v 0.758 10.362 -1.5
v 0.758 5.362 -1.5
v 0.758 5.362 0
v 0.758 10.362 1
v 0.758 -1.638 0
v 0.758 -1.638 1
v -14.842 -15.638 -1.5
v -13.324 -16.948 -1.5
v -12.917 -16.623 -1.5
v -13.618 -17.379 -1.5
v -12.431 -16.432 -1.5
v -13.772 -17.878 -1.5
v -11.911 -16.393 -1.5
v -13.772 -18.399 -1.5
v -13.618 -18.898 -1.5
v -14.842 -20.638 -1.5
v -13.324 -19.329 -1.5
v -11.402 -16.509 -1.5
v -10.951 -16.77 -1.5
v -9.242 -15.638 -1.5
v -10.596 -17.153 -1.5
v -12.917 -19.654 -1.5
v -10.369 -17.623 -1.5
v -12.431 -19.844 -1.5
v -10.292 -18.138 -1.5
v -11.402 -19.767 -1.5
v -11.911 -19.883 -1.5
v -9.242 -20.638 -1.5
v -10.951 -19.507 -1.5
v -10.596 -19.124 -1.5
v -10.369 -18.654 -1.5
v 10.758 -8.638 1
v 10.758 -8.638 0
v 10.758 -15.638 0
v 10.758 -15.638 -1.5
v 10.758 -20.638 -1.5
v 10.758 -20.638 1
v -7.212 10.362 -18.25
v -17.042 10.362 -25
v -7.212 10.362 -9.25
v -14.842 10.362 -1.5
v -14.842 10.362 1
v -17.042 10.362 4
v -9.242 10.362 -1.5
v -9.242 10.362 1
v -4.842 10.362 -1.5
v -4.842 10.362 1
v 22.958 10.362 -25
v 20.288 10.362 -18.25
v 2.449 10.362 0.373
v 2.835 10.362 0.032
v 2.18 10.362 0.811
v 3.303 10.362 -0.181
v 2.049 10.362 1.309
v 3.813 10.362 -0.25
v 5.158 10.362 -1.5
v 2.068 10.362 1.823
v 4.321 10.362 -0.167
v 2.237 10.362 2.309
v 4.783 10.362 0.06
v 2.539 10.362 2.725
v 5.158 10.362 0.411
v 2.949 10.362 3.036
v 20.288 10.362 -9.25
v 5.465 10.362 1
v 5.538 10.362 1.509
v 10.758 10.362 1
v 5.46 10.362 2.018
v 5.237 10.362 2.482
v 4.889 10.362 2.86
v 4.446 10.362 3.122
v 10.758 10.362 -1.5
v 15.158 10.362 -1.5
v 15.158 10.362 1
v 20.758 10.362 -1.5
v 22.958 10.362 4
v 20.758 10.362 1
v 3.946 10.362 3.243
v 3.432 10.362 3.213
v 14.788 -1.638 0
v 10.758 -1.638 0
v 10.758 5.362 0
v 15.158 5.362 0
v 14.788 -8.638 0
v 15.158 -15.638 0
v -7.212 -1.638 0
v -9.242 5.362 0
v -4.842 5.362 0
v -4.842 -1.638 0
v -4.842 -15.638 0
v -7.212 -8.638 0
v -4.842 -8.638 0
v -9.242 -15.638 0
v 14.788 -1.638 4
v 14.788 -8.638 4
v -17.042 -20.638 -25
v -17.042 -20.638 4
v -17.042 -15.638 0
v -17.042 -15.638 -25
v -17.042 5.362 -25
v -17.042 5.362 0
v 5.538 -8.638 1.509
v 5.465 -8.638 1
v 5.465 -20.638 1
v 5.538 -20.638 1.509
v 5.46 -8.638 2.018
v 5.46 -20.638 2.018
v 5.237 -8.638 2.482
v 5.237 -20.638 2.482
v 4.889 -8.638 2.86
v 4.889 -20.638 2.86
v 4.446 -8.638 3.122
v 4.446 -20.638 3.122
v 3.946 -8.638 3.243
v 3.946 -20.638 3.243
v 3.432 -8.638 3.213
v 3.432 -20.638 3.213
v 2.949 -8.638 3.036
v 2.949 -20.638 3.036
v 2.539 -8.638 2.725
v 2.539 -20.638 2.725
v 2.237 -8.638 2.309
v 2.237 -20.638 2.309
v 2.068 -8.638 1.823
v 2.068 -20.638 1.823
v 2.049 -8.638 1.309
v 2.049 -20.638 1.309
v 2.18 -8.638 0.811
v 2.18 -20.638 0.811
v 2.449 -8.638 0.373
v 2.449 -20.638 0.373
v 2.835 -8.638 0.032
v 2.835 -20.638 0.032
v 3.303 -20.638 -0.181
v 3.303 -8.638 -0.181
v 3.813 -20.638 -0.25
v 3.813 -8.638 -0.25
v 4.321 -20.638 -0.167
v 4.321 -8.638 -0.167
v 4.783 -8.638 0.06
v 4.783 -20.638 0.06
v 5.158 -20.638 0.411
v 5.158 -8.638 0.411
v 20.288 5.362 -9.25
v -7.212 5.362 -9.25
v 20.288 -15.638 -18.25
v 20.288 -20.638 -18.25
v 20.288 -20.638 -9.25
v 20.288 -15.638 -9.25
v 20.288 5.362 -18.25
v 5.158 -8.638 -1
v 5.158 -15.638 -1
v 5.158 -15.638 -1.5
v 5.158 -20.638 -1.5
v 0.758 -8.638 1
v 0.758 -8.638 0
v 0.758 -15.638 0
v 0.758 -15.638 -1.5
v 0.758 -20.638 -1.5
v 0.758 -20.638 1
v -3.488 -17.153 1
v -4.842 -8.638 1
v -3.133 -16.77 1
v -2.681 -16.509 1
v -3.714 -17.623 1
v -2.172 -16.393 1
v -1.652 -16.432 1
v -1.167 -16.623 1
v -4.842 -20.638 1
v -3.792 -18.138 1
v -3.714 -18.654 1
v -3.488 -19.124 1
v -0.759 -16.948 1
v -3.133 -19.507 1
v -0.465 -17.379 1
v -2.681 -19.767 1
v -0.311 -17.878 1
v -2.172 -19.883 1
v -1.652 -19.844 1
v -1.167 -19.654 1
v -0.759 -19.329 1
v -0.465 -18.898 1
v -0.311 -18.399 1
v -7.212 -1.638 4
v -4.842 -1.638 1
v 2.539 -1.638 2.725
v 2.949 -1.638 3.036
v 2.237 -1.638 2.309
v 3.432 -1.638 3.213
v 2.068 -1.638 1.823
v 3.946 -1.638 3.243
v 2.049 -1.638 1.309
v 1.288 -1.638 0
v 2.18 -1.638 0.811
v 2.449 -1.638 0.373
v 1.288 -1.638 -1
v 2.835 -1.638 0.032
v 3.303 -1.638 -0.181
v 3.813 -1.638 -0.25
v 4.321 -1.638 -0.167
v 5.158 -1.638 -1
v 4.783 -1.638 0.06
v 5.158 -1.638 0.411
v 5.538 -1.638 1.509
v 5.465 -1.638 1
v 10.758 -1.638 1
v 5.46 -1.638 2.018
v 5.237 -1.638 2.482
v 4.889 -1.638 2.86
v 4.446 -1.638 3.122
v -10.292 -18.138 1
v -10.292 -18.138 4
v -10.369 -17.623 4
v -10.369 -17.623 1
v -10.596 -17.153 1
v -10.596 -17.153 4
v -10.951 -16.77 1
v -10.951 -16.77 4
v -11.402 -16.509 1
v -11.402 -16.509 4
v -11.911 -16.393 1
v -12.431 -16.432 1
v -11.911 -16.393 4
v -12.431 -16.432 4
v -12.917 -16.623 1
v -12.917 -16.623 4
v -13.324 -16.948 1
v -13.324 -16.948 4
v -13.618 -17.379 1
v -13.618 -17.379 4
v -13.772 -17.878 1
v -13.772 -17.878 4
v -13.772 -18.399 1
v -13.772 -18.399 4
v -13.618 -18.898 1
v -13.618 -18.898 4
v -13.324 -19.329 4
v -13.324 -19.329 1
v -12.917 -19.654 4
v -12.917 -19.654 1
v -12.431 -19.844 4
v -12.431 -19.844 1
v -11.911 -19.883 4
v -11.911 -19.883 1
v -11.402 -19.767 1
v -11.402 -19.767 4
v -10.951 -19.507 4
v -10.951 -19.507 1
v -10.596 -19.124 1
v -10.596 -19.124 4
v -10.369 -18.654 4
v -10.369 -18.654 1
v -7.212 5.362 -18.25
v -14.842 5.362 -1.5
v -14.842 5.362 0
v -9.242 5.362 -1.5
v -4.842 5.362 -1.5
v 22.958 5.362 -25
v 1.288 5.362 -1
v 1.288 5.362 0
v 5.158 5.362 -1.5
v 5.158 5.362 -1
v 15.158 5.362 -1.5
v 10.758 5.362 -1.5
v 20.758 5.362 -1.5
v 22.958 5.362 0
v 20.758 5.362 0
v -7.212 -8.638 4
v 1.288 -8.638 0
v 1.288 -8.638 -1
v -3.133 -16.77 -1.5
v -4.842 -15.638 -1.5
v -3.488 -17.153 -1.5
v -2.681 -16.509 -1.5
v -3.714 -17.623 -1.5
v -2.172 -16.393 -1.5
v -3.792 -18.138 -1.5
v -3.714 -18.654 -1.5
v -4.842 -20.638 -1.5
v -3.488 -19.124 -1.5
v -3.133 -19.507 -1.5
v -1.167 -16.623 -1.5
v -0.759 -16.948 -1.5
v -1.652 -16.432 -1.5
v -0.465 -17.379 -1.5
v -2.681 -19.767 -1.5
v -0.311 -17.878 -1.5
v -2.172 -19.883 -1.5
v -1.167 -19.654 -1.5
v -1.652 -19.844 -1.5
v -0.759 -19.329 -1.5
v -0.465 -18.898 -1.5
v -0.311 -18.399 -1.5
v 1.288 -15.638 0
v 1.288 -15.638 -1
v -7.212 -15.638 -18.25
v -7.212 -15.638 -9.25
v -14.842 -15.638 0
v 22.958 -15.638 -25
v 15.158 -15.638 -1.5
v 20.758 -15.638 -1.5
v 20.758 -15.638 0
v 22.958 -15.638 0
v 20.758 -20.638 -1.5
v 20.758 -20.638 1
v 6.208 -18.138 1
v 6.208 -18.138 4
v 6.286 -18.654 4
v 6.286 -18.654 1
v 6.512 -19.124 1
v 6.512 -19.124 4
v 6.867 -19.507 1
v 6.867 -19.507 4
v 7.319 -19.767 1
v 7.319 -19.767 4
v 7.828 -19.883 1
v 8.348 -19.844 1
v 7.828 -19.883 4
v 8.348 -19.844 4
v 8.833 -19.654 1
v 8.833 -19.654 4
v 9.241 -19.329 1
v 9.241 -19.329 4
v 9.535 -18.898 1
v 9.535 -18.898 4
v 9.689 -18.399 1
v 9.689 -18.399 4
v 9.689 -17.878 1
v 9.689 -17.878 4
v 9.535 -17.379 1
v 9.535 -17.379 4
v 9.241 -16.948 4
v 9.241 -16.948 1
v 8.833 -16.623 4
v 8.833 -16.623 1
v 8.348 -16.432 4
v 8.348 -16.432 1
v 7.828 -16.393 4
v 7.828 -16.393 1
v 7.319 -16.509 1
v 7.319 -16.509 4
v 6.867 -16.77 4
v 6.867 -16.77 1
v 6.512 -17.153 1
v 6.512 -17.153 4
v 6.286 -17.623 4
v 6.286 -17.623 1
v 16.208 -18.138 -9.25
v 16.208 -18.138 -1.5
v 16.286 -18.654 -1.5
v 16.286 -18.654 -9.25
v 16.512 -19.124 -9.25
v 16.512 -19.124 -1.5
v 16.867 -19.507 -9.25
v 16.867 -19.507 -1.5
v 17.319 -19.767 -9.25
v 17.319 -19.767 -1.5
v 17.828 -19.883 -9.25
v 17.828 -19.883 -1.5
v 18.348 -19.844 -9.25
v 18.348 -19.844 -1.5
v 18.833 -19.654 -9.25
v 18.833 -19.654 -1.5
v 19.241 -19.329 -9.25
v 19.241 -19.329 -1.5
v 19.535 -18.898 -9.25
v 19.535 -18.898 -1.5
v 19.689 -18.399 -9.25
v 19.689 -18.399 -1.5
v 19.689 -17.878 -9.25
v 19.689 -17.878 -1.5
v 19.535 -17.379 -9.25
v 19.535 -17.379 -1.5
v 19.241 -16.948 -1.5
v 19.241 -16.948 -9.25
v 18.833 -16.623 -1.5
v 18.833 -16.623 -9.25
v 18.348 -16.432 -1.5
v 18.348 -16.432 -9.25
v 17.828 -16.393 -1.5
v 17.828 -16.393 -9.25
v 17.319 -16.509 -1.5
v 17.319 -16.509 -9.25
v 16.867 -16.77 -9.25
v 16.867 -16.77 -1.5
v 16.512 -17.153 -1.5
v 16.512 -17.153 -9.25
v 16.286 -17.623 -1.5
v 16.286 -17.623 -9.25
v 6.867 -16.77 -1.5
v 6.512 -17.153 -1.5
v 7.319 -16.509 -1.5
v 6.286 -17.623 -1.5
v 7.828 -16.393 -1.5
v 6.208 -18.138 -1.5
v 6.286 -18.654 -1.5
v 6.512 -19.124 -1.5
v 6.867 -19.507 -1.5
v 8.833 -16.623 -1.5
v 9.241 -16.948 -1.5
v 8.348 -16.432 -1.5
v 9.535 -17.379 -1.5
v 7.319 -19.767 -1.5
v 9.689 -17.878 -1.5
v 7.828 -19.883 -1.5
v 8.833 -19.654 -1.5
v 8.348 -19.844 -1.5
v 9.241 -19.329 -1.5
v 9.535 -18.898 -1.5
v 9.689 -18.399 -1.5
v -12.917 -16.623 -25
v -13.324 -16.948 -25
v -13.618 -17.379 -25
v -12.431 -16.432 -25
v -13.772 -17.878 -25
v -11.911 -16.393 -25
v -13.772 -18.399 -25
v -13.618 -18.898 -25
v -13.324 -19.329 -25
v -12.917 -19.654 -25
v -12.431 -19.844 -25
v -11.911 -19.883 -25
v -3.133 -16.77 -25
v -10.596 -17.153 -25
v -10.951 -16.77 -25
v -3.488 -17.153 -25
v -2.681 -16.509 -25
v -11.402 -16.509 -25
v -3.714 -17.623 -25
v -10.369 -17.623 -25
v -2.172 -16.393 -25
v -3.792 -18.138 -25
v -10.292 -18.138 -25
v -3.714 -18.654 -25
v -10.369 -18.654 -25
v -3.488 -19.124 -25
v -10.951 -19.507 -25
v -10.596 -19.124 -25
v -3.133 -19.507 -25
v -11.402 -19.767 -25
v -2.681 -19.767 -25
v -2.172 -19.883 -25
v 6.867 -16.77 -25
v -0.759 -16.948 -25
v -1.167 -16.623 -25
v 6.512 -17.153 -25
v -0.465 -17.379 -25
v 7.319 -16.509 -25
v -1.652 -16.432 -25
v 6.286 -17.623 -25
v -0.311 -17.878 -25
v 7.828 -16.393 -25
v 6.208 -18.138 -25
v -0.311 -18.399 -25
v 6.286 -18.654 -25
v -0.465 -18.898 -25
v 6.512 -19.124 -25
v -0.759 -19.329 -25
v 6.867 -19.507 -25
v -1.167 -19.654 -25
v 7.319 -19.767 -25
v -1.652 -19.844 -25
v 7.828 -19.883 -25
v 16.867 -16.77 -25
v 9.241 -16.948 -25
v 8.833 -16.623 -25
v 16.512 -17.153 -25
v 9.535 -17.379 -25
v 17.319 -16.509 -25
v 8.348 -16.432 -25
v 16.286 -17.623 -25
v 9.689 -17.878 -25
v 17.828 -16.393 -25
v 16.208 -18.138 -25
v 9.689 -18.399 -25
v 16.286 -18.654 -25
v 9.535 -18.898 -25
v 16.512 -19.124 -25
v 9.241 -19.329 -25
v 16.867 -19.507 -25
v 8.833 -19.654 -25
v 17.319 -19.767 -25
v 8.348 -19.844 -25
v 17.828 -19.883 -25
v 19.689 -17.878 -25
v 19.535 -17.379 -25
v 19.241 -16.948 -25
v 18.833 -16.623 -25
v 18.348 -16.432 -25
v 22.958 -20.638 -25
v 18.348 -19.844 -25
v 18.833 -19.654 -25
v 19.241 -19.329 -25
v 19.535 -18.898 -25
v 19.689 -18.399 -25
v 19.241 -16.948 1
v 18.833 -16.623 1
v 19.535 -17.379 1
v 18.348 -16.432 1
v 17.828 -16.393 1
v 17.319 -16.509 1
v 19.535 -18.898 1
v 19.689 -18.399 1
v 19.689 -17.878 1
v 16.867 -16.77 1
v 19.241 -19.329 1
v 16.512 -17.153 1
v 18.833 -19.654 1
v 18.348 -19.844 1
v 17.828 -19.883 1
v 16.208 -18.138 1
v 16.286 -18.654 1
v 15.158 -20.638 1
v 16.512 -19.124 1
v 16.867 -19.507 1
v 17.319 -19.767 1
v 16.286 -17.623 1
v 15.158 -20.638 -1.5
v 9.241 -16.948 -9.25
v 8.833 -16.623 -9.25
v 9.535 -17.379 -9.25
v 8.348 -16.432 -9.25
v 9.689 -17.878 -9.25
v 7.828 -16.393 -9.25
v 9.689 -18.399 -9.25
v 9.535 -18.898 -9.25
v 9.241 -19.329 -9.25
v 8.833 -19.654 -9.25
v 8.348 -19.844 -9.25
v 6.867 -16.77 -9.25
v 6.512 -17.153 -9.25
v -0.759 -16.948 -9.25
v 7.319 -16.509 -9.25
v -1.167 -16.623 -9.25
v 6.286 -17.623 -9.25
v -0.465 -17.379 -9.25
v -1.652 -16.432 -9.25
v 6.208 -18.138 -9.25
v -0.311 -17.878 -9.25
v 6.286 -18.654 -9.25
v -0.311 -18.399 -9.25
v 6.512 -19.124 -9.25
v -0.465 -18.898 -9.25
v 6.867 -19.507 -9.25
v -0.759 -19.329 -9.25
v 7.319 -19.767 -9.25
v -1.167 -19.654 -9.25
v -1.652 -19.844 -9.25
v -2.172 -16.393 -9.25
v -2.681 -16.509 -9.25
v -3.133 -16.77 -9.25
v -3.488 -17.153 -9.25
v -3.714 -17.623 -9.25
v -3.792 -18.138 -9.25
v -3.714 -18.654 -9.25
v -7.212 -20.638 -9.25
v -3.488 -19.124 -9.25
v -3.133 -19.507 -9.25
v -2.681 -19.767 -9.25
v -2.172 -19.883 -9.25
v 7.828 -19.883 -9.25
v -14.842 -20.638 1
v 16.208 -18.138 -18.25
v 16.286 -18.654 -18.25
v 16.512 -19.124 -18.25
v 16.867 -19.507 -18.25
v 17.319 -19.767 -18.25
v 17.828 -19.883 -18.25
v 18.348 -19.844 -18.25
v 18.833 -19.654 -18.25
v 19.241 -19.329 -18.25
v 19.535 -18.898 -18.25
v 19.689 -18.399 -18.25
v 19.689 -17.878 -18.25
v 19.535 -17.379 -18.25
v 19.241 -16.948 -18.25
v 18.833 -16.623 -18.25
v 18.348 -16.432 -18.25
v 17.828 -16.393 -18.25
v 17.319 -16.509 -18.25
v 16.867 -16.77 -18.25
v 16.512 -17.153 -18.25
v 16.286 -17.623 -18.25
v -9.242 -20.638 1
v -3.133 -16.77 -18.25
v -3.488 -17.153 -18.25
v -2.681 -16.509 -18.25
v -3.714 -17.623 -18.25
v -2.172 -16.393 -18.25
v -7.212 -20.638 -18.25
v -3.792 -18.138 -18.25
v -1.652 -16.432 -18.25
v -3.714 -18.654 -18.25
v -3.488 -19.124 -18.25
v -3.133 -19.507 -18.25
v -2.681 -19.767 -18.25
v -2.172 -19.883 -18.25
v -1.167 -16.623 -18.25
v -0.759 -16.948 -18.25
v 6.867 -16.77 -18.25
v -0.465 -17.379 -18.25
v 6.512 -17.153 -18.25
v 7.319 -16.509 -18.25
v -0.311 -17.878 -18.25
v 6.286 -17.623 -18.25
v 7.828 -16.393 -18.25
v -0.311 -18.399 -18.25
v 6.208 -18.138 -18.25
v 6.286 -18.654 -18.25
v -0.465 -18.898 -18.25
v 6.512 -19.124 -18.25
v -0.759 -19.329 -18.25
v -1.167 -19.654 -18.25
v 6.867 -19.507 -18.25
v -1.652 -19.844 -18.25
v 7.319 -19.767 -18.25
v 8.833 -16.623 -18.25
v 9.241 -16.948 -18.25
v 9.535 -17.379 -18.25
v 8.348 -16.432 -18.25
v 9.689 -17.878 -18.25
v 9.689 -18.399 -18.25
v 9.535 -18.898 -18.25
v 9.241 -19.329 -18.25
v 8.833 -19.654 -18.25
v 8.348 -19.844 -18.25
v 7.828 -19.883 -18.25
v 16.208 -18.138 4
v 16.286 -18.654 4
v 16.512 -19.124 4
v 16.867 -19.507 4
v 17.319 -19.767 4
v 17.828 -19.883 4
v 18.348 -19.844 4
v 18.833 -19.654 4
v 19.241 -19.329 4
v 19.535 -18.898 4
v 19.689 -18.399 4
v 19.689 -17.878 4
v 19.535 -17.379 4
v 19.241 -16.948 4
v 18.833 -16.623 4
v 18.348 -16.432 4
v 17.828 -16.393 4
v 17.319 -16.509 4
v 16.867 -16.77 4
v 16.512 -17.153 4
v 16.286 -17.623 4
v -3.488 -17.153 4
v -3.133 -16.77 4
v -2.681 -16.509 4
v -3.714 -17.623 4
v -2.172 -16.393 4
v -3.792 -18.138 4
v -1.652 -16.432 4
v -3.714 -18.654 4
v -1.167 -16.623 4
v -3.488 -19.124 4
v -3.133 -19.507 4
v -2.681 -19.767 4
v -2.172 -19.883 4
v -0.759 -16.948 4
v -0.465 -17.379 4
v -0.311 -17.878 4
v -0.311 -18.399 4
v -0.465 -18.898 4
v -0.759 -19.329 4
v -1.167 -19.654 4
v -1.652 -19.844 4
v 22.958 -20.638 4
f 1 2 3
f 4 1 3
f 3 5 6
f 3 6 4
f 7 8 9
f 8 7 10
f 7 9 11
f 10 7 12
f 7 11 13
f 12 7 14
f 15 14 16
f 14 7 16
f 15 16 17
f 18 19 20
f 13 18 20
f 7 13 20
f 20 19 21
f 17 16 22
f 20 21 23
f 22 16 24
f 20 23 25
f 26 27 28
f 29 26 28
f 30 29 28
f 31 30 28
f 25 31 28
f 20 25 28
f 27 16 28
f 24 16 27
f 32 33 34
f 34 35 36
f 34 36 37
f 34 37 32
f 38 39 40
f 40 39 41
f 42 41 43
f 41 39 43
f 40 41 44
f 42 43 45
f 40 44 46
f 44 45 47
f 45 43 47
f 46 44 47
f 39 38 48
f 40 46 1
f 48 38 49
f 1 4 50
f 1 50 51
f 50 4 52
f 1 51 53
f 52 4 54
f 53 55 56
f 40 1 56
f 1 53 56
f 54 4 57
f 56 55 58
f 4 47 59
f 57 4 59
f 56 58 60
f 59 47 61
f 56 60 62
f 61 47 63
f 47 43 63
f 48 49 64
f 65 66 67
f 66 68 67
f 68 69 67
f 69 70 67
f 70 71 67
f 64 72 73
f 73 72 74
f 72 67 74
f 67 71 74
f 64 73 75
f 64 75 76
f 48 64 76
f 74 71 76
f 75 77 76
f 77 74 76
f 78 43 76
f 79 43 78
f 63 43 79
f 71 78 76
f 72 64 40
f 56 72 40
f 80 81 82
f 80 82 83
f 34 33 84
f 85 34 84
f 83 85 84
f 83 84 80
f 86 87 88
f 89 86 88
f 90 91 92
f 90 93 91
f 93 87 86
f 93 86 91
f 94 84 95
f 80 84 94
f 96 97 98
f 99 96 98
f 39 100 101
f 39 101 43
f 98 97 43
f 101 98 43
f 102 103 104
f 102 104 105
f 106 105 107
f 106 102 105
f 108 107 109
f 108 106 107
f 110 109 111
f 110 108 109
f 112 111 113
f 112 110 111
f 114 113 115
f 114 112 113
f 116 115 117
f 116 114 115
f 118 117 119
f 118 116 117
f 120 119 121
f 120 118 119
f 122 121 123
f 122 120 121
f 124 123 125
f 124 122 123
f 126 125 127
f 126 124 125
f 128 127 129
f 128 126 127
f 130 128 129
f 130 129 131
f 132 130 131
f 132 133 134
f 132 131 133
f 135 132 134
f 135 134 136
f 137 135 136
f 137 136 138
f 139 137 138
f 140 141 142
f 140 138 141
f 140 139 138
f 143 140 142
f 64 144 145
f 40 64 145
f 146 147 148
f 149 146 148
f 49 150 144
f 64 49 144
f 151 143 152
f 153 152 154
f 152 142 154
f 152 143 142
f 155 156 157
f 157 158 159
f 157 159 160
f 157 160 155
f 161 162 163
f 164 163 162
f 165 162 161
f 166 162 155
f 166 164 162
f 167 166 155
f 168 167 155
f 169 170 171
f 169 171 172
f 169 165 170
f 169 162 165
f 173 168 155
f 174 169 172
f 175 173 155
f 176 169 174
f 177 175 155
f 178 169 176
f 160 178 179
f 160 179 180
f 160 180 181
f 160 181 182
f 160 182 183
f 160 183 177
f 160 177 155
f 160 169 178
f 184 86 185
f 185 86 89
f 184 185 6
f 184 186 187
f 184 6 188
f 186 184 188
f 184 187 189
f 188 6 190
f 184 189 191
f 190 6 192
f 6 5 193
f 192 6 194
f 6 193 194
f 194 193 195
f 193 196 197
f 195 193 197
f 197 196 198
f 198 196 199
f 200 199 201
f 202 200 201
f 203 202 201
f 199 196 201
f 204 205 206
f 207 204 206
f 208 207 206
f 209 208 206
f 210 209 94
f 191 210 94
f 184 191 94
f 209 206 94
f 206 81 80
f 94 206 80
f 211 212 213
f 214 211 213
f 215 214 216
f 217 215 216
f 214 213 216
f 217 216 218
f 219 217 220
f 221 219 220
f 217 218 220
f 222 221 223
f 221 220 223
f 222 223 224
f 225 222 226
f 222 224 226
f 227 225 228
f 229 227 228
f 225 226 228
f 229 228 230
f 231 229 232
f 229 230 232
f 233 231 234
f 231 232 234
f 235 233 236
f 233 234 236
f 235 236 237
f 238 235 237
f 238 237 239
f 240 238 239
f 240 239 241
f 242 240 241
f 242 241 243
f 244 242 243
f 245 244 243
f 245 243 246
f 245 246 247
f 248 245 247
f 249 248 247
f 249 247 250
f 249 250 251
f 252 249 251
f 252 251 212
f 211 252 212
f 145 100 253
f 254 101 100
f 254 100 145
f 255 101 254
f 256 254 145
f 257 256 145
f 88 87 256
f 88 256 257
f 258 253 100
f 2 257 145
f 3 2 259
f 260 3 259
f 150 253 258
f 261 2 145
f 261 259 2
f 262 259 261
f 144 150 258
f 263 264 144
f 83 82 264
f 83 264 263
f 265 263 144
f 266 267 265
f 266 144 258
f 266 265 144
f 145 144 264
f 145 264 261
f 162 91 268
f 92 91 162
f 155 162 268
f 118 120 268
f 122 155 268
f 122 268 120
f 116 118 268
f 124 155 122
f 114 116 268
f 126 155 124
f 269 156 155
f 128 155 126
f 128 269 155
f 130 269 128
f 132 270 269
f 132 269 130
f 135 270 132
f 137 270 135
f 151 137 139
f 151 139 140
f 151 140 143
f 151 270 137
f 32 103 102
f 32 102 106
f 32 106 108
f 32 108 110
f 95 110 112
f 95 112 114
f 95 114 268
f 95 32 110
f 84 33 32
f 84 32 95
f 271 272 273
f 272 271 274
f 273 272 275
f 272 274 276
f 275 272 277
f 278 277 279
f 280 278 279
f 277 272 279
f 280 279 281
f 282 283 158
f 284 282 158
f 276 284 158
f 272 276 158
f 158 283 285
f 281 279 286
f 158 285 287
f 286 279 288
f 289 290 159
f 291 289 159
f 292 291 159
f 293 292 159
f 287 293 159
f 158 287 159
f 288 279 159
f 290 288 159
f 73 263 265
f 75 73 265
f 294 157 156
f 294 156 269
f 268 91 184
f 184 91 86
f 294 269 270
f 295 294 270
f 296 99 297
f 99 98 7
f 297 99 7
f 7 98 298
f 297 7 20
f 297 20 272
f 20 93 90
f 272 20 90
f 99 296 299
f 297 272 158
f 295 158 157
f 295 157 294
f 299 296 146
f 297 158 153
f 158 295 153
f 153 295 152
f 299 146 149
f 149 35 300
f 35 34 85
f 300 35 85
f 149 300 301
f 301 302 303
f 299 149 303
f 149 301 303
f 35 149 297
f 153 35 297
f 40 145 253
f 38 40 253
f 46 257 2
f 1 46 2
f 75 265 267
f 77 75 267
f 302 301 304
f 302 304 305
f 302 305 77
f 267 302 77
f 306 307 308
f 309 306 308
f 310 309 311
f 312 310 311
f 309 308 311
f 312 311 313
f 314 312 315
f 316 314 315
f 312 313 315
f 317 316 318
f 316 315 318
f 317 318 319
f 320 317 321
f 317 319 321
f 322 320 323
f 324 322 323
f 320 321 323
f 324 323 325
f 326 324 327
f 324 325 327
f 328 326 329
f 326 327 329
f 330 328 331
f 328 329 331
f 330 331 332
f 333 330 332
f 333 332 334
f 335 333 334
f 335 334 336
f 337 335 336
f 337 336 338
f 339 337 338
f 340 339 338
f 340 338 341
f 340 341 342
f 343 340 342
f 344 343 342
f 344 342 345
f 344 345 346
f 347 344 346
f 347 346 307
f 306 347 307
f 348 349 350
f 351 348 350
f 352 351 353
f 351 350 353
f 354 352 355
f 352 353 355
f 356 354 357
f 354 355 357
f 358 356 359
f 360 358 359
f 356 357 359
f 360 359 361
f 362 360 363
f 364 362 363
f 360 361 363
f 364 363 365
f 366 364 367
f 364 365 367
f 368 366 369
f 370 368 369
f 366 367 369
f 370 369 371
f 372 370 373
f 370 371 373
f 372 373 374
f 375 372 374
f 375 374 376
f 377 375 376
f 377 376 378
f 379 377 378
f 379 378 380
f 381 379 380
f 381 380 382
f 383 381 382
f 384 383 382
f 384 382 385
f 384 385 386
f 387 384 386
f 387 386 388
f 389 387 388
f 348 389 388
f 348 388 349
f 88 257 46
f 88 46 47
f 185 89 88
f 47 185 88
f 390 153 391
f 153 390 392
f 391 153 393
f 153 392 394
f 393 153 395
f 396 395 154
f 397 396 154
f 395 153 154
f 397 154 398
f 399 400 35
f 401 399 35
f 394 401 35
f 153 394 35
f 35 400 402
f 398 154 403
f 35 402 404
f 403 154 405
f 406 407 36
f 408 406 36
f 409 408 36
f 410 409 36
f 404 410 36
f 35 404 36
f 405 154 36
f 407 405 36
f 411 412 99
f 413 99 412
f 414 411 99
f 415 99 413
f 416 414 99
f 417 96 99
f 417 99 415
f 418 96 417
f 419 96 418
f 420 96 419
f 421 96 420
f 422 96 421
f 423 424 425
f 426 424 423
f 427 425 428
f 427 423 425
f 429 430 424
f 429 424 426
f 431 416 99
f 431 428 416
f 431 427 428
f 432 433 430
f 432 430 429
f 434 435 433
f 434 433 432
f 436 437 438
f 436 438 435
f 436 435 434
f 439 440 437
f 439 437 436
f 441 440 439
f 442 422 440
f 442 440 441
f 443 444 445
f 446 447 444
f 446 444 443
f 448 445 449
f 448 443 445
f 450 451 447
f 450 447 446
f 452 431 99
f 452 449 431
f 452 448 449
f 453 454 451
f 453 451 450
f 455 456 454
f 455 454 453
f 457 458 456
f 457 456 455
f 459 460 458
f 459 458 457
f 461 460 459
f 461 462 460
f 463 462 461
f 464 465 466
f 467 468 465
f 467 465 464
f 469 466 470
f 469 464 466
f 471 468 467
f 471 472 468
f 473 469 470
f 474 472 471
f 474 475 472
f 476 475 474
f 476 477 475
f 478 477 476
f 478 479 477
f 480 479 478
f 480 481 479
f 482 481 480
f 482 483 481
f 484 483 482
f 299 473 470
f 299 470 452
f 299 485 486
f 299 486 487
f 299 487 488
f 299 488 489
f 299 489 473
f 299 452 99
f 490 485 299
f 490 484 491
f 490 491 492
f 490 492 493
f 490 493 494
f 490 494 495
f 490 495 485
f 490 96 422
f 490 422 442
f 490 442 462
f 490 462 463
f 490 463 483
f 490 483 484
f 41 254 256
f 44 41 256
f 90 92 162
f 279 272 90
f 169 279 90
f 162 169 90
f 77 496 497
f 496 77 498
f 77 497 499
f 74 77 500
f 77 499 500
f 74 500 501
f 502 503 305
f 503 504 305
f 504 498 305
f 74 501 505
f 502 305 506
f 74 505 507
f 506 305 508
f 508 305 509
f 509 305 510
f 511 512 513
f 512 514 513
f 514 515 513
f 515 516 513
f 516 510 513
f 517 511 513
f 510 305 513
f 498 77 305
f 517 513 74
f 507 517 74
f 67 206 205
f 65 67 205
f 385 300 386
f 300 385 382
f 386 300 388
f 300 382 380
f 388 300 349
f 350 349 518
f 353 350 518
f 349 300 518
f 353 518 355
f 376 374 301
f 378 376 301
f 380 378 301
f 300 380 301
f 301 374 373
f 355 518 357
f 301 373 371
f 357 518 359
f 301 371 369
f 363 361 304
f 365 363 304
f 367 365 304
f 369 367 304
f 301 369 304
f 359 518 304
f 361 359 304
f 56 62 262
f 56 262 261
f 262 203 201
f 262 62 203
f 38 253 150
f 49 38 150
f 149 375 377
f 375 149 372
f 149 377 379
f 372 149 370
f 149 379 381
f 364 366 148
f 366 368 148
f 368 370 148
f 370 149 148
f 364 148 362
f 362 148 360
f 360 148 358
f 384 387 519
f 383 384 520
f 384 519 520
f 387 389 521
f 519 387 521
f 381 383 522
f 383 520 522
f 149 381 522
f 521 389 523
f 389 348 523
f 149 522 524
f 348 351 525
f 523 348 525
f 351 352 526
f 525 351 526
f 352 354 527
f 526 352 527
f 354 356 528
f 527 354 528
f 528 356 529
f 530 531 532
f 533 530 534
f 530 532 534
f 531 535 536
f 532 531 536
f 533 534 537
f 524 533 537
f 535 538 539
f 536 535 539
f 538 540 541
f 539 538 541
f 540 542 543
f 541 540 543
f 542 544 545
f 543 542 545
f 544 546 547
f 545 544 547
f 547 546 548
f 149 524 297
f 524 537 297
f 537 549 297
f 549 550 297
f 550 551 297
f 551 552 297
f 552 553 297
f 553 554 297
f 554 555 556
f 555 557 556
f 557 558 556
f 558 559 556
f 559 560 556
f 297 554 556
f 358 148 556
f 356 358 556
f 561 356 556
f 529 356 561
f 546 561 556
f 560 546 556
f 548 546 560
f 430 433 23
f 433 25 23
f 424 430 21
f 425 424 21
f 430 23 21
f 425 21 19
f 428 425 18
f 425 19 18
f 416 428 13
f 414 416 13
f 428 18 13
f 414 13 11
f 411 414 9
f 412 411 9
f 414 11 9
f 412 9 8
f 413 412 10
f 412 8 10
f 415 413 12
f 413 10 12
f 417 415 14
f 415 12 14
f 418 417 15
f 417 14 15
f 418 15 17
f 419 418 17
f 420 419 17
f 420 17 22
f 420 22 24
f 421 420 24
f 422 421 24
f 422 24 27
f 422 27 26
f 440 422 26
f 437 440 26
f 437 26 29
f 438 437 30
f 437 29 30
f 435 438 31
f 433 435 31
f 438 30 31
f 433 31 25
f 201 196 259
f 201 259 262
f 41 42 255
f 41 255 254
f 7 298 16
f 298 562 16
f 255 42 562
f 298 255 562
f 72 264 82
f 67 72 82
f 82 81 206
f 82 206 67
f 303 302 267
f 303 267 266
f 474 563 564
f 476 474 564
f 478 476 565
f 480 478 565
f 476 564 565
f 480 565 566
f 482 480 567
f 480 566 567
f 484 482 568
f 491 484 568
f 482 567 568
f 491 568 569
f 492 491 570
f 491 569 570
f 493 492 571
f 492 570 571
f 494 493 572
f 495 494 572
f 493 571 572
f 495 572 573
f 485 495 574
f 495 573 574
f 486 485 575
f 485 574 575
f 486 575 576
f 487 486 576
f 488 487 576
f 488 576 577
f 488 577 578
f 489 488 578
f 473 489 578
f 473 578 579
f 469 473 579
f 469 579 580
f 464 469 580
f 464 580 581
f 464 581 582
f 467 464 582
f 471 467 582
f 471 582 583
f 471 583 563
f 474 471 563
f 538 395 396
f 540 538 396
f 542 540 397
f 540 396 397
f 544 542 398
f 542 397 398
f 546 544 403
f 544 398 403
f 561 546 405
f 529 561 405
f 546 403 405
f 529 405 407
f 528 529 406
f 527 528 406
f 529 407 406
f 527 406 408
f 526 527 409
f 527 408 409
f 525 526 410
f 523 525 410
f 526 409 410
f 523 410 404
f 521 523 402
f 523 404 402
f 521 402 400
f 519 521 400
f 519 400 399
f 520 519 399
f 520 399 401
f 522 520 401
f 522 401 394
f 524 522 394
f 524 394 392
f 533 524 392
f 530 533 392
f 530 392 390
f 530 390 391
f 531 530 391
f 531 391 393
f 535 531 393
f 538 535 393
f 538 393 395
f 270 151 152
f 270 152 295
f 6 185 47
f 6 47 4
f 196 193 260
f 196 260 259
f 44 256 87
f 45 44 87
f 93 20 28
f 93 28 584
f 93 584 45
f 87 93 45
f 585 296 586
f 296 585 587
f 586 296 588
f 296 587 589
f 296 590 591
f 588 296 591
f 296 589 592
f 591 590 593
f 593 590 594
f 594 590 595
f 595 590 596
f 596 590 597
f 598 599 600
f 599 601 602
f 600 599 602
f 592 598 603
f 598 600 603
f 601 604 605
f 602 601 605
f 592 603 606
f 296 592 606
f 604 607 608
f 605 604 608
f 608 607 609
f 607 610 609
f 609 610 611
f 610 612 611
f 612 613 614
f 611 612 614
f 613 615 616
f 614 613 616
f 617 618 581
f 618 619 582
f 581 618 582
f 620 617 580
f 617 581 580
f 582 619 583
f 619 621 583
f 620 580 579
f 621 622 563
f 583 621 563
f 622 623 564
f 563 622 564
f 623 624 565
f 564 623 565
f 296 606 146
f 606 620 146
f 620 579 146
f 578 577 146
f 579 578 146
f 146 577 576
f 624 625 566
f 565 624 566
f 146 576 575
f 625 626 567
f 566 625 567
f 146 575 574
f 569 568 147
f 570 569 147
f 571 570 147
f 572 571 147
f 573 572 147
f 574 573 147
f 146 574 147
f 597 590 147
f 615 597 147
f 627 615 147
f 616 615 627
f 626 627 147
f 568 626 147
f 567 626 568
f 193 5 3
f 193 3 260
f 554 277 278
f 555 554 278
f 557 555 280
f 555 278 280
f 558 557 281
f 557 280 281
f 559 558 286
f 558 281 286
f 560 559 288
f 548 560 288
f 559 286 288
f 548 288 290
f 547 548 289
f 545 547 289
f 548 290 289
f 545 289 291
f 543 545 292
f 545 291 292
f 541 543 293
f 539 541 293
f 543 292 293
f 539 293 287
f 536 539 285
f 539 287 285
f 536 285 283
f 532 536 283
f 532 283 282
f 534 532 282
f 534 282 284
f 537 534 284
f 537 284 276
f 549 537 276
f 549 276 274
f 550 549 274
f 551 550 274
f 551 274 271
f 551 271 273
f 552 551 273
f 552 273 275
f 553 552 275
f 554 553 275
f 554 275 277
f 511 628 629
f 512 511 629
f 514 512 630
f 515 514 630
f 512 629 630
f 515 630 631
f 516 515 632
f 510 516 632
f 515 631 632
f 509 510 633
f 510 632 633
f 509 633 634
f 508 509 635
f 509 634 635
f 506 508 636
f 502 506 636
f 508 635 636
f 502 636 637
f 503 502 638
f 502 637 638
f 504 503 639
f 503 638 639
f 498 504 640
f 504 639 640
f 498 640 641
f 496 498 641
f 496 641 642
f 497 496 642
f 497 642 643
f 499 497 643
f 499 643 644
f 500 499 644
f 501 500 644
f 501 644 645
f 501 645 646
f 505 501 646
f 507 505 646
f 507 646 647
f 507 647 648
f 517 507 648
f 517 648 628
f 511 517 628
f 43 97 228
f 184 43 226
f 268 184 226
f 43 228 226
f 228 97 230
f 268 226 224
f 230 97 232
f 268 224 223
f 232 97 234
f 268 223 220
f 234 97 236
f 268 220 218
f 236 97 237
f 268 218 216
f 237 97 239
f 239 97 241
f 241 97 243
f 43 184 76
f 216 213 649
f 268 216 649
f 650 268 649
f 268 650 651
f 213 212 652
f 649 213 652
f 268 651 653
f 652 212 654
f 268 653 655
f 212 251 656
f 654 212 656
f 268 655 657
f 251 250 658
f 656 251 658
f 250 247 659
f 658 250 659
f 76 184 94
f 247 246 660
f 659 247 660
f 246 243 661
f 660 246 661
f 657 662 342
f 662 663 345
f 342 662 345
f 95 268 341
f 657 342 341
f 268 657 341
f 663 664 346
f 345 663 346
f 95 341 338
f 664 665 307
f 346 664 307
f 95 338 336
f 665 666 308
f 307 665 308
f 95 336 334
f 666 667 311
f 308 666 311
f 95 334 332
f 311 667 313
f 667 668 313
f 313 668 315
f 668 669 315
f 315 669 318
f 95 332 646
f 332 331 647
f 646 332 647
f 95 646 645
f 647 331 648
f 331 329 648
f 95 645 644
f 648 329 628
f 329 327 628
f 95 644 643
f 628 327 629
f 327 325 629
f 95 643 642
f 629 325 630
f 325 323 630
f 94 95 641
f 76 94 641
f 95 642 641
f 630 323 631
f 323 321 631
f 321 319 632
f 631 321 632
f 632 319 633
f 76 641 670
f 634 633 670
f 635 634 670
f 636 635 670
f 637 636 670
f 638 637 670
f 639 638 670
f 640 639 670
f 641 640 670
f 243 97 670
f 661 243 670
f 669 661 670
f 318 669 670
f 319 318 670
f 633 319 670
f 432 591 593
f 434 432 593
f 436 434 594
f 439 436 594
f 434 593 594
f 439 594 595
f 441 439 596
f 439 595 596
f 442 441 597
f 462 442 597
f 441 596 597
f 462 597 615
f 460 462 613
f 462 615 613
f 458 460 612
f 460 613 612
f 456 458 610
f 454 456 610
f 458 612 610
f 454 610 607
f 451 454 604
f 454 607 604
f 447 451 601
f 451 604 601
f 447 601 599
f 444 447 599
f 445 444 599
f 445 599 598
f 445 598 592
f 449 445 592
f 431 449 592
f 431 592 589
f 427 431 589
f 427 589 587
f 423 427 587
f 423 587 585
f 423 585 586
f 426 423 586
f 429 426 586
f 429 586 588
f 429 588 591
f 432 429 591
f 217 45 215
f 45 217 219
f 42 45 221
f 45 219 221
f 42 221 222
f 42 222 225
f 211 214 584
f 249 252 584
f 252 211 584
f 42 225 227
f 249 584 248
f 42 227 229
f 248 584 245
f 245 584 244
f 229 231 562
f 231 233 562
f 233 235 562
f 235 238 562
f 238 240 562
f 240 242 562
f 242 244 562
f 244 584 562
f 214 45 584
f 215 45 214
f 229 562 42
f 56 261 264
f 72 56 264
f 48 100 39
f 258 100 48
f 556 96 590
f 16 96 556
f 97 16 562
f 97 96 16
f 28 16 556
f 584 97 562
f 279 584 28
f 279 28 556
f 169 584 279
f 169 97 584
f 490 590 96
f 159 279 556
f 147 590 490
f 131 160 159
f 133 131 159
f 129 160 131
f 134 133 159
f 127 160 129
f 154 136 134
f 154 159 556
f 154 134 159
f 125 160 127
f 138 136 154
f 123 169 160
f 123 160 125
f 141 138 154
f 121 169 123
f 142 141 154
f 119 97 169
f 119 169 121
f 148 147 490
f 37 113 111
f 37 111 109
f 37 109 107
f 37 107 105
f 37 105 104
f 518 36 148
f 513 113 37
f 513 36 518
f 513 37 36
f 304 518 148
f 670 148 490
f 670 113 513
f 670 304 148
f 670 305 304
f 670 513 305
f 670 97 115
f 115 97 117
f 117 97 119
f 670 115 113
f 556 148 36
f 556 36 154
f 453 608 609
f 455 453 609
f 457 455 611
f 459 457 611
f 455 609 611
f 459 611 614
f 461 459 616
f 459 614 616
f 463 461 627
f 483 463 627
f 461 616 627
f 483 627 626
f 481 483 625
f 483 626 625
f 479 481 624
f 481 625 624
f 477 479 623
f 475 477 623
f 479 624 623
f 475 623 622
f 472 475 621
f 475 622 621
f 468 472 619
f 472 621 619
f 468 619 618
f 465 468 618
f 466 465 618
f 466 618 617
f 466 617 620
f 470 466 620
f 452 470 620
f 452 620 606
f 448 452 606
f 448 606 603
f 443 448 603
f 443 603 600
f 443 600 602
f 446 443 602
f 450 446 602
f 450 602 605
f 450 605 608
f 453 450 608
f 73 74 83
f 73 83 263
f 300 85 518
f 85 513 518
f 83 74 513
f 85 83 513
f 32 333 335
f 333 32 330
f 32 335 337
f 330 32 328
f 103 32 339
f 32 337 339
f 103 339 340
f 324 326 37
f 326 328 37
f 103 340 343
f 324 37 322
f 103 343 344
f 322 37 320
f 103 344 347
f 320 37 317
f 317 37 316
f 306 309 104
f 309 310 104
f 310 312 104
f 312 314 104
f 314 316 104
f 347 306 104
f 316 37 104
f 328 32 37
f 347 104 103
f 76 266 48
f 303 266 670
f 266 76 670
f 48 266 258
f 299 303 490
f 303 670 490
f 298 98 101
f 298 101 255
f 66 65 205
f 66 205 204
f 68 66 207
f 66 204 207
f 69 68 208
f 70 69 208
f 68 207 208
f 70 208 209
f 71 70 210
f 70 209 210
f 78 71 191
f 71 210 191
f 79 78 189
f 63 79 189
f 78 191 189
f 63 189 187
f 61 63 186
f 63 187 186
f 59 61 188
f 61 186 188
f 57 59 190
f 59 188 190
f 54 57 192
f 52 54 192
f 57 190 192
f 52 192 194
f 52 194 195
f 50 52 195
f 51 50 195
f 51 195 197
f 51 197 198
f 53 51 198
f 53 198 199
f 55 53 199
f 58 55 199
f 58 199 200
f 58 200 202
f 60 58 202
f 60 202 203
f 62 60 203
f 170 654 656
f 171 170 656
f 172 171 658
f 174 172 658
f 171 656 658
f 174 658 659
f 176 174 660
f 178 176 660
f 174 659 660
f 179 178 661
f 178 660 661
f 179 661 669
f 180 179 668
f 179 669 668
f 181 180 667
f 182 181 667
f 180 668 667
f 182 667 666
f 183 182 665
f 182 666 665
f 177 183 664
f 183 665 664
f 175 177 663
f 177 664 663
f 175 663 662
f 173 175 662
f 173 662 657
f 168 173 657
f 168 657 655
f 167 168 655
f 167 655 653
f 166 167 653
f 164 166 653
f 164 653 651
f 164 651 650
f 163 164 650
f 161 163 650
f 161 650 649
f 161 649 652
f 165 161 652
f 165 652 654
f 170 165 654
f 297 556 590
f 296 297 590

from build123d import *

# Parameters (mm, degrees)
F0_W      = 48.3402396964
F0_H      = 20
F0_W_2    = 22
F0_H_2    = 7
F1_DEPTH  = 4
F3_DEPTH  = 1
F4_R      = 1.75
F5_DEPTH  = 20.001
F6_DEPTH  = 5.5
F7_DEPTH  = 5.5
F8_W      = 21.6701198482
F8_H      = 5
F9_DEPTH  = 25
F10_W     = 21.6701198482
F10_H     = 5
F11_DEPTH = 25
F12_W     = 5
F12_H     = 5
F13_DEPTH = 24
F14_W     = 5
F14_H     = 5
F15_DEPTH = 24
F16_W     = 11
F16_H     = 4.5
F17_DEPTH = 31.001
F19_DEPTH = 29.001
F18_R     = 1.75
F20_DEPTH = 10
F21_W     = 5.6
F21_H     = 2.5
F22_DEPTH = 31.001
F23_DEPTH = 29.001


# Not quite as in the source:
# - a feature names something its author has since deleted; it is built from what else it names


with BuildPart() as f1:
    # F0 (on Top) → F1 (new body)
    with BuildSketch(Plane.XY):
        with Locations((3.7882691845, -5.1383437738)):
            Rectangle(F0_W, F0_H)
        with Locations((3.7882691845, -5.1383437738)):
            Rectangle(F0_W_2, F0_H_2, mode=Mode.SUBTRACT)
    extrude(amount=F1_DEPTH)

    # F2 (on face) → F3 (join)
    with BuildSketch(Plane(origin=(0, 0, 0), x_dir=(1, 0, 0), z_dir=(0, 0, -1))):
        Polygon((6.2882691845, 1.6383437738), (3.7882691845, 1.6383437738), (1.2882691845, 1.6383437738), (1.2882691845, -4.8616562262), (6.2882691845, -4.8616562262), align=None)
        Polygon((1.2882691845, 8.6383437738), (3.7882691845, 8.6383437738), (6.2882691845, 8.6383437738), (6.2882691845, 15.1383437738), (1.2882691845, 15.1383437738), align=None)
    extrude(amount=F3_DEPTH)

    # F4 (on face) → F5 (cut, through all)
    with BuildSketch(Plane.XZ.offset(15.1383437738)):
        with Locations((3.7882691845, 1.5)):
            Circle(F4_R)
    extrude(amount=-F5_DEPTH, mode=Mode.SUBTRACT)

    # F6 (add): a face of the model
    f6_faces = [f1.faces().sort_by_distance(p)[0] for p in [
        (-19.8958693087, -15.1383437738, 2),
    ]]
    extrude(f6_faces, amount=F6_DEPTH)

    # F7 (add): a face of the model
    f7_faces = [f1.faces().sort_by_distance(p)[0] for p in [
        (27.4724076777, 4.8616562262, 2),
    ]]
    extrude(f7_faces, amount=F7_DEPTH)

    # F8 (on face) → F9 (join)
    with BuildSketch(Plane(origin=(0, 0, 0), x_dir=(1, 0, 0), z_dir=(0, 0, -1))):
        with Locations((17.1233291086, -7.8616562262)):
            Rectangle(F8_W, F8_H)
        with Locations((17.1233291086, 18.1383437738)):
            Rectangle(F8_W, F8_H)
    extrude(amount=F9_DEPTH)

    # F10 (on face) → F11 (join)
    with BuildSketch(Plane(origin=(0, 0, 0), x_dir=(1, 0, 0), z_dir=(0, 0, -1))):
        with Locations((-9.5467907396, 18.1383437738)):
            Rectangle(F10_W, F10_H)
        with Locations((-9.5467907396, -7.8616562262)):
            Rectangle(F10_W, F10_H)
    extrude(amount=F11_DEPTH)

    # F12 (on face) → F13 (join)
    with BuildSketch(Plane(origin=(0, 0, -1), x_dir=(1, 0, 0), z_dir=(0, 0, -1))):
        with Locations((3.7882691845, 18.1383437738)):
            Rectangle(F12_W, F12_H)
    extrude(amount=F13_DEPTH)

    # F14 (on face) → F15 (join)
    with BuildSketch(Plane(origin=(0, 0, -1), x_dir=(1, 0, 0), z_dir=(0, 0, -1))):
        with Locations((3.7882691845, -7.8616562262)):
            Rectangle(F14_W, F14_H)
    extrude(amount=F15_DEPTH)

    # F16 (on face) → F17 (cut, through all)
    with BuildSketch(Plane.XZ.offset(20.6383437738)):
        with Locations((9.2882691845, -16)):
            Rectangle(F16_W, F16_H)
        Polygon((3.7882691845, -18.25), (3.7882691845, -13.75), (14.7882691845, -13.75), (14.7882691845, -9.25), (-7.2117308155, -9.25), (-7.2117308155, -18.25), align=None)
        Polygon((14.7882691845, -9.25), (14.7882691845, -13.75), (14.7882691845, -18.25), (20.2882691845, -18.25), (20.2882691845, -9.25), align=None)
    extrude(amount=-F17_DEPTH, mode=Mode.SUBTRACT)

    # F18 (on face) → F19 (cut, through all)
    with BuildSketch(Plane.XY.offset(4)):
        Polygon((-20.3818506637, -20.6383437738), (-17.0416109673, -20.6383437738), (-17.0416109673, -5.1383437738), (-17.0416109673, 10.3616562262), (-20.3818506637, 10.3616562262), align=None)
    extrude(amount=-F19_DEPTH, mode=Mode.SUBTRACT)

    # F18 (on face) → F20 (cut)
    with BuildSketch(Plane.XY.offset(4)):
        with Locations((-12.0416109673, -18.1383437738)):
            Circle(F18_R)
    extrude(amount=-F20_DEPTH, mode=Mode.SUBTRACT)

    # F21 (on face) → F22 (cut, through all)
    with BuildSketch(Plane.XZ.offset(20.6383437738)):
        Polygon((-12.0416109673, 1), (-14.8416109673, 1), (-14.8416109673, -1.5), (-9.2416109673, -1.5), (-9.2416109673, 1), align=None)
        Polygon((27.9583890327, 4), (22.9583890327, 4), (22.9583890327, 1), (22.9583890327, -25), (27.9583890327, -25), align=None)
        with Locations((-2.0416109673, -0.25)):
            Rectangle(F21_W, F21_H)
        with BuildLine():
            Line((5.1583890327, 0.4112982035), (5.1583890327, -1.5))
            Line((5.1583890327, -1.5), (10.7583890327, -1.5))
            Line((10.7583890327, -1.5), (10.7583890327, 1))
            Line((10.7583890327, 1), (5.4653201677, 1))
            ThreePointArc((5.4653201677, 1), (5.3400278546, 0.6909604275), (5.1583890327, 0.4112982035))
        make_face()
        Polygon((20.7583890327, -1.5), (20.7583890327, 1), (17.9583890327, 1), (15.1583890327, 1), (15.1583890327, -1.5), align=None)
    extrude(amount=-F22_DEPTH, mode=Mode.SUBTRACT)

    # F18 (on face) → F23 (cut, through all)
    with BuildSketch(Plane.XY.offset(4)):
        Polygon((-17.0416109673, -20.6383437738), (-17.0416109673, -5.1383437738), (-17.0416109673, 10.3616562262), (-20.3818506637, 10.3616562262), (-20.3818506637, -20.6383437738), align=None)
        with Locations((-12.0416109673, -18.1383437738)):
            Circle(F18_R)
        with BuildLine():
            ThreePointArc((19.7083890327, -18.1383437738), (17.9583890327, -16.3883437738), (16.2083890327, -18.1383437738))
            ThreePointArc((16.2083890327, -18.1383437738), (17.9583890327, -19.8883437738), (19.7083890327, -18.1383437738))
        make_face()
        with BuildLine():
            ThreePointArc((9.7083890327, -18.1383437738), (7.9583890327, -16.3883437738), (6.2083890327, -18.1383437738))
            Line((6.2083890327, -18.1383437738), (7.9583890327, -18.1383437738))
            Line((7.9583890327, -18.1383437738), (9.7083890327, -18.1383437738))
        make_face()
        with BuildLine():
            Line((7.9583890327, -18.1383437738), (6.2083890327, -18.1383437738))
            ThreePointArc((6.2083890327, -18.1383437738), (7.9583890327, -19.8883437738), (9.7083890327, -18.1383437738))
            Line((9.7083890327, -18.1383437738), (7.9583890327, -18.1383437738))
        make_face()
        with BuildLine():
            ThreePointArc((-0.2916109673, -18.1383437738), (-2.0416109673, -16.3883437738), (-3.7916109673, -18.1383437738))
            Line((-3.7916109673, -18.1383437738), (-2.0416109673, -18.1383437738))
            Line((-2.0416109673, -18.1383437738), (-0.2916109673, -18.1383437738))
        make_face()
        with BuildLine():
            Line((-2.0416109673, -18.1383437738), (-3.7916109673, -18.1383437738))
            ThreePointArc((-3.7916109673, -18.1383437738), (-2.0416109673, -19.8883437738), (-0.2916109673, -18.1383437738))
            Line((-0.2916109673, -18.1383437738), (-2.0416109673, -18.1383437738))
        make_face()
    extrude(amount=-F23_DEPTH, mode=Mode.SUBTRACT)


solid = f1.part
